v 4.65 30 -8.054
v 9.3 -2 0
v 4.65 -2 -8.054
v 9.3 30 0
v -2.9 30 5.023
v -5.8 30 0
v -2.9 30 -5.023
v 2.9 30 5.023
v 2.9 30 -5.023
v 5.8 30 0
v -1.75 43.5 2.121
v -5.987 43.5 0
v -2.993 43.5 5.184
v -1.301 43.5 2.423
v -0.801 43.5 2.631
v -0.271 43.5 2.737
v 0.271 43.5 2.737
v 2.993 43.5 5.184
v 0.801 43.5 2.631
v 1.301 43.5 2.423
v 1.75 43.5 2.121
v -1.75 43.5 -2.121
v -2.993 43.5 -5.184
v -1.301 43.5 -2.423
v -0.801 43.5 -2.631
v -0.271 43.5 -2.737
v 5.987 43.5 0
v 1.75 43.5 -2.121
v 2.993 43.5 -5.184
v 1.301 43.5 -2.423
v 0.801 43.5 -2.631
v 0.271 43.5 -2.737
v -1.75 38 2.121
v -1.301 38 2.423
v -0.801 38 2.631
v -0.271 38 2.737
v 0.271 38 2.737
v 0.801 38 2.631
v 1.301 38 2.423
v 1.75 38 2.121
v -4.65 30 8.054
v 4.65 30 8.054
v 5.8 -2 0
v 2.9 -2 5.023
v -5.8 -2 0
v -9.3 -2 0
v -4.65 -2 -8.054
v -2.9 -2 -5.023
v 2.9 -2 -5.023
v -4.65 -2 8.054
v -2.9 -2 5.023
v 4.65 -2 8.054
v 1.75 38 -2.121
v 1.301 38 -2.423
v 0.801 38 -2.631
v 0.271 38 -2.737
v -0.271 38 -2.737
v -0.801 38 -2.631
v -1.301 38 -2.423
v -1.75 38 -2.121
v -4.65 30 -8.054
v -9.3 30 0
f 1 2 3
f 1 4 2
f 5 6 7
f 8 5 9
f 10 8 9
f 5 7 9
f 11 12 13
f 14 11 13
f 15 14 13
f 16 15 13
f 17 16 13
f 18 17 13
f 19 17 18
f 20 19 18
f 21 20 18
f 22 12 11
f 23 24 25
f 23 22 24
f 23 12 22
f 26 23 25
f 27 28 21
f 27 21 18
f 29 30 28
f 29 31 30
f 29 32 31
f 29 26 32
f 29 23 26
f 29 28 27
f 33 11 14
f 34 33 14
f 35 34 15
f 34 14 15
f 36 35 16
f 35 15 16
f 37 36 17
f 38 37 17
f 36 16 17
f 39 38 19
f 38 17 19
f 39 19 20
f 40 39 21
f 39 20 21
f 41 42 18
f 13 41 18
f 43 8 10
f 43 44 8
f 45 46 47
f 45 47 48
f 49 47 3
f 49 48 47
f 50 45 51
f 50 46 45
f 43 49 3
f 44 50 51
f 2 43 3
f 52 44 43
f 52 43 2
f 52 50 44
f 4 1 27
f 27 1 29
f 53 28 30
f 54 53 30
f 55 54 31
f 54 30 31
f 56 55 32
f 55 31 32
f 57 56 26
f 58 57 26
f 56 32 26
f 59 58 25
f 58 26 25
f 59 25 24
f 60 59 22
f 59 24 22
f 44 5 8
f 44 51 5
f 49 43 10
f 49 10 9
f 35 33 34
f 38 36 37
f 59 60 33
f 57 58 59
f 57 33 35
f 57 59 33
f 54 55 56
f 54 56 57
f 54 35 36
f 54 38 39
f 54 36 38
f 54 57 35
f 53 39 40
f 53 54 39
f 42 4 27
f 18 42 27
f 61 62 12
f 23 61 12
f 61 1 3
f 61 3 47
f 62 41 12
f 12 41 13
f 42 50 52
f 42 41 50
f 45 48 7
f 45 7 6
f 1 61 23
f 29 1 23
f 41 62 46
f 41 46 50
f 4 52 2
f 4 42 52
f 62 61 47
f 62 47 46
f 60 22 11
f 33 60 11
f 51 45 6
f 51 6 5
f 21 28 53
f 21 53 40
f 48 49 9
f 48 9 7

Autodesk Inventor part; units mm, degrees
ref_plane "YZ Plane" through (0, 0, 0) normal (1, 0, 0) x (0, 1, 0)
ref_plane "XZ Plane" through (0, 0, 0) normal (0, 1, 0) x (-1, 0, 0)
ref_plane "XY Plane" through (0, 0, 0) normal (0, 0, 1) x (1, 0, 0)
sketch "Boceto1" plane through (0, 0, 0) normal (0, 1, 0) x (-1, 0, 0)
  line L0 (0, 0) -> (5.8, 0)
  line L1 (5.8, 0) -> (9.3, 0)
  line L2 (5.8, 0) -> (2.9, -5.0229)
  line L3 (2.9, -5.0229) -> (-2.9, -5.0229)
  line L4 (-2.9, -5.0229) -> (-5.8, 0)
  line L5 (-5.8, 0) -> (-2.9, 5.0229)
  line L6 (-2.9, 5.0229) -> (2.9, 5.0229)
  line L7 (2.9, 5.0229) -> (5.8, 0)
  line L8 (9.3, 0) -> (4.65, -8.054)
  line L9 (4.65, -8.054) -> (-4.65, -8.054)
  line L10 (-4.65, -8.054) -> (-9.3, 0)
  line L11 (-9.3, 0) -> (-4.65, 8.054)
  line L12 (-4.65, 8.054) -> (4.65, 8.054)
  line L13 (4.65, 8.054) -> (9.3, 0)
  dimension "d0" = 5.8
  dimension "d1" = 3.5
extrude "Extrusión1" add sketch "Boceto1" along normal blind 30
sketch "Boceto2" plane through (0, 30, 0) normal (0, 1, 0) x (1, 0, 0)
  line L0 (-4.65, 8.054) -> (-9.3, 0) projected
  line L1 (-9.3, 0) -> (-4.65, 8.054)
  line L2 (-4.65, 8.054) -> (4.65, 8.054)
  line L3 (4.65, 8.054) -> (9.3, 0)
  line L4 (9.3, 0) -> (4.65, -8.054)
  line L5 (4.65, -8.054) -> (-4.65, -8.054)
  line L6 (-4.65, -8.054) -> (-9.3, 0)
  point P0 (0, 0)
  point P1 (0, 0)
extrude "Extrusión2" add sketch "Boceto2" along normal blind 13.5 draft -12
sketch "Boceto3" plane through (0, 0, 0) normal (0, -1, 0) x (1, 0, 0)
  line L0 (9.3, 0) -> (5.9866, 0) projected
  line L1 (9.3, 0) -> (4.65, -8.054)
  line L2 (4.65, -8.054) -> (-4.65, -8.054)
  line L3 (-4.65, -8.054) -> (-9.3, 0)
  line L4 (-9.3, 0) -> (-4.65, 8.054)
  line L5 (-4.65, 8.054) -> (4.65, 8.054)
  line L6 (4.65, 8.054) -> (9.3, 0)
  point P0 (0, 0)
  point P1 (0, 0)
sketch "Boceto4" plane through (0, 0, 0) normal (0, -1, 0) x (1, 0, 0)
  line L0 (5.8, 0) -> (2.9, -5.0229)
  line L1 (2.9, -5.0229) -> (-2.9, -5.0229)
  line L2 (-2.9, -5.0229) -> (-5.8, 0)
  line L3 (-5.8, 0) -> (-2.9, 5.0229)
  line L4 (-2.9, 5.0229) -> (2.9, 5.0229)
  line L5 (2.9, 5.0229) -> (5.8, 0)
  point P0 (0, 0)
  point P1 (0, 0)
extrude "Extrusión3" add sketch "Boceto3" along normal blind 2
sketch "Boceto5" plane through (0, -2, 0) normal (0, -1, 0) x (1, 0, 0)
  line L0 (0, 0) -> (5.8, 0)
  line L1 (5.8, 0) -> (2.9, -5.0229)
  line L2 (2.9, -5.0229) -> (-2.9, -5.0229)
  line L3 (-2.9, -5.0229) -> (-5.8, 0)
  line L4 (-5.8, 0) -> (-2.9, 5.0229)
  line L5 (-2.9, 5.0229) -> (2.9, 5.0229)
  line L6 (2.9, 5.0229) -> (5.8, 0)
  dimension "d8" = 5.8
extrude "Extrusión4" cut sketch "Boceto5" against normal blind 2
sketch "Boceto6" plane through (0, 43.5, 0) normal (0, 1, 0) x (1, 0, 0)
  line L0 (-1.75, 0) -> (-1.75, 2.1213)
  line L1 (-1.75, 0) -> (-1.75, -2.1213)
  line L2 (1.75, 0) -> (1.75, 2.1213)
  line L3 (1.75, 0) -> (1.75, -2.1213)
  arc A0 (-1.75, -2.1213) -> (1.75, -2.1213) centre (0, 0) ccw
  arc A1 (1.75, 2.1213) -> (-1.75, 2.1213) centre (0, 0) ccw
extrude "Extrusión5" cut sketch "Boceto6" against normal blind 5.5
properties part number "acopladorV3"
